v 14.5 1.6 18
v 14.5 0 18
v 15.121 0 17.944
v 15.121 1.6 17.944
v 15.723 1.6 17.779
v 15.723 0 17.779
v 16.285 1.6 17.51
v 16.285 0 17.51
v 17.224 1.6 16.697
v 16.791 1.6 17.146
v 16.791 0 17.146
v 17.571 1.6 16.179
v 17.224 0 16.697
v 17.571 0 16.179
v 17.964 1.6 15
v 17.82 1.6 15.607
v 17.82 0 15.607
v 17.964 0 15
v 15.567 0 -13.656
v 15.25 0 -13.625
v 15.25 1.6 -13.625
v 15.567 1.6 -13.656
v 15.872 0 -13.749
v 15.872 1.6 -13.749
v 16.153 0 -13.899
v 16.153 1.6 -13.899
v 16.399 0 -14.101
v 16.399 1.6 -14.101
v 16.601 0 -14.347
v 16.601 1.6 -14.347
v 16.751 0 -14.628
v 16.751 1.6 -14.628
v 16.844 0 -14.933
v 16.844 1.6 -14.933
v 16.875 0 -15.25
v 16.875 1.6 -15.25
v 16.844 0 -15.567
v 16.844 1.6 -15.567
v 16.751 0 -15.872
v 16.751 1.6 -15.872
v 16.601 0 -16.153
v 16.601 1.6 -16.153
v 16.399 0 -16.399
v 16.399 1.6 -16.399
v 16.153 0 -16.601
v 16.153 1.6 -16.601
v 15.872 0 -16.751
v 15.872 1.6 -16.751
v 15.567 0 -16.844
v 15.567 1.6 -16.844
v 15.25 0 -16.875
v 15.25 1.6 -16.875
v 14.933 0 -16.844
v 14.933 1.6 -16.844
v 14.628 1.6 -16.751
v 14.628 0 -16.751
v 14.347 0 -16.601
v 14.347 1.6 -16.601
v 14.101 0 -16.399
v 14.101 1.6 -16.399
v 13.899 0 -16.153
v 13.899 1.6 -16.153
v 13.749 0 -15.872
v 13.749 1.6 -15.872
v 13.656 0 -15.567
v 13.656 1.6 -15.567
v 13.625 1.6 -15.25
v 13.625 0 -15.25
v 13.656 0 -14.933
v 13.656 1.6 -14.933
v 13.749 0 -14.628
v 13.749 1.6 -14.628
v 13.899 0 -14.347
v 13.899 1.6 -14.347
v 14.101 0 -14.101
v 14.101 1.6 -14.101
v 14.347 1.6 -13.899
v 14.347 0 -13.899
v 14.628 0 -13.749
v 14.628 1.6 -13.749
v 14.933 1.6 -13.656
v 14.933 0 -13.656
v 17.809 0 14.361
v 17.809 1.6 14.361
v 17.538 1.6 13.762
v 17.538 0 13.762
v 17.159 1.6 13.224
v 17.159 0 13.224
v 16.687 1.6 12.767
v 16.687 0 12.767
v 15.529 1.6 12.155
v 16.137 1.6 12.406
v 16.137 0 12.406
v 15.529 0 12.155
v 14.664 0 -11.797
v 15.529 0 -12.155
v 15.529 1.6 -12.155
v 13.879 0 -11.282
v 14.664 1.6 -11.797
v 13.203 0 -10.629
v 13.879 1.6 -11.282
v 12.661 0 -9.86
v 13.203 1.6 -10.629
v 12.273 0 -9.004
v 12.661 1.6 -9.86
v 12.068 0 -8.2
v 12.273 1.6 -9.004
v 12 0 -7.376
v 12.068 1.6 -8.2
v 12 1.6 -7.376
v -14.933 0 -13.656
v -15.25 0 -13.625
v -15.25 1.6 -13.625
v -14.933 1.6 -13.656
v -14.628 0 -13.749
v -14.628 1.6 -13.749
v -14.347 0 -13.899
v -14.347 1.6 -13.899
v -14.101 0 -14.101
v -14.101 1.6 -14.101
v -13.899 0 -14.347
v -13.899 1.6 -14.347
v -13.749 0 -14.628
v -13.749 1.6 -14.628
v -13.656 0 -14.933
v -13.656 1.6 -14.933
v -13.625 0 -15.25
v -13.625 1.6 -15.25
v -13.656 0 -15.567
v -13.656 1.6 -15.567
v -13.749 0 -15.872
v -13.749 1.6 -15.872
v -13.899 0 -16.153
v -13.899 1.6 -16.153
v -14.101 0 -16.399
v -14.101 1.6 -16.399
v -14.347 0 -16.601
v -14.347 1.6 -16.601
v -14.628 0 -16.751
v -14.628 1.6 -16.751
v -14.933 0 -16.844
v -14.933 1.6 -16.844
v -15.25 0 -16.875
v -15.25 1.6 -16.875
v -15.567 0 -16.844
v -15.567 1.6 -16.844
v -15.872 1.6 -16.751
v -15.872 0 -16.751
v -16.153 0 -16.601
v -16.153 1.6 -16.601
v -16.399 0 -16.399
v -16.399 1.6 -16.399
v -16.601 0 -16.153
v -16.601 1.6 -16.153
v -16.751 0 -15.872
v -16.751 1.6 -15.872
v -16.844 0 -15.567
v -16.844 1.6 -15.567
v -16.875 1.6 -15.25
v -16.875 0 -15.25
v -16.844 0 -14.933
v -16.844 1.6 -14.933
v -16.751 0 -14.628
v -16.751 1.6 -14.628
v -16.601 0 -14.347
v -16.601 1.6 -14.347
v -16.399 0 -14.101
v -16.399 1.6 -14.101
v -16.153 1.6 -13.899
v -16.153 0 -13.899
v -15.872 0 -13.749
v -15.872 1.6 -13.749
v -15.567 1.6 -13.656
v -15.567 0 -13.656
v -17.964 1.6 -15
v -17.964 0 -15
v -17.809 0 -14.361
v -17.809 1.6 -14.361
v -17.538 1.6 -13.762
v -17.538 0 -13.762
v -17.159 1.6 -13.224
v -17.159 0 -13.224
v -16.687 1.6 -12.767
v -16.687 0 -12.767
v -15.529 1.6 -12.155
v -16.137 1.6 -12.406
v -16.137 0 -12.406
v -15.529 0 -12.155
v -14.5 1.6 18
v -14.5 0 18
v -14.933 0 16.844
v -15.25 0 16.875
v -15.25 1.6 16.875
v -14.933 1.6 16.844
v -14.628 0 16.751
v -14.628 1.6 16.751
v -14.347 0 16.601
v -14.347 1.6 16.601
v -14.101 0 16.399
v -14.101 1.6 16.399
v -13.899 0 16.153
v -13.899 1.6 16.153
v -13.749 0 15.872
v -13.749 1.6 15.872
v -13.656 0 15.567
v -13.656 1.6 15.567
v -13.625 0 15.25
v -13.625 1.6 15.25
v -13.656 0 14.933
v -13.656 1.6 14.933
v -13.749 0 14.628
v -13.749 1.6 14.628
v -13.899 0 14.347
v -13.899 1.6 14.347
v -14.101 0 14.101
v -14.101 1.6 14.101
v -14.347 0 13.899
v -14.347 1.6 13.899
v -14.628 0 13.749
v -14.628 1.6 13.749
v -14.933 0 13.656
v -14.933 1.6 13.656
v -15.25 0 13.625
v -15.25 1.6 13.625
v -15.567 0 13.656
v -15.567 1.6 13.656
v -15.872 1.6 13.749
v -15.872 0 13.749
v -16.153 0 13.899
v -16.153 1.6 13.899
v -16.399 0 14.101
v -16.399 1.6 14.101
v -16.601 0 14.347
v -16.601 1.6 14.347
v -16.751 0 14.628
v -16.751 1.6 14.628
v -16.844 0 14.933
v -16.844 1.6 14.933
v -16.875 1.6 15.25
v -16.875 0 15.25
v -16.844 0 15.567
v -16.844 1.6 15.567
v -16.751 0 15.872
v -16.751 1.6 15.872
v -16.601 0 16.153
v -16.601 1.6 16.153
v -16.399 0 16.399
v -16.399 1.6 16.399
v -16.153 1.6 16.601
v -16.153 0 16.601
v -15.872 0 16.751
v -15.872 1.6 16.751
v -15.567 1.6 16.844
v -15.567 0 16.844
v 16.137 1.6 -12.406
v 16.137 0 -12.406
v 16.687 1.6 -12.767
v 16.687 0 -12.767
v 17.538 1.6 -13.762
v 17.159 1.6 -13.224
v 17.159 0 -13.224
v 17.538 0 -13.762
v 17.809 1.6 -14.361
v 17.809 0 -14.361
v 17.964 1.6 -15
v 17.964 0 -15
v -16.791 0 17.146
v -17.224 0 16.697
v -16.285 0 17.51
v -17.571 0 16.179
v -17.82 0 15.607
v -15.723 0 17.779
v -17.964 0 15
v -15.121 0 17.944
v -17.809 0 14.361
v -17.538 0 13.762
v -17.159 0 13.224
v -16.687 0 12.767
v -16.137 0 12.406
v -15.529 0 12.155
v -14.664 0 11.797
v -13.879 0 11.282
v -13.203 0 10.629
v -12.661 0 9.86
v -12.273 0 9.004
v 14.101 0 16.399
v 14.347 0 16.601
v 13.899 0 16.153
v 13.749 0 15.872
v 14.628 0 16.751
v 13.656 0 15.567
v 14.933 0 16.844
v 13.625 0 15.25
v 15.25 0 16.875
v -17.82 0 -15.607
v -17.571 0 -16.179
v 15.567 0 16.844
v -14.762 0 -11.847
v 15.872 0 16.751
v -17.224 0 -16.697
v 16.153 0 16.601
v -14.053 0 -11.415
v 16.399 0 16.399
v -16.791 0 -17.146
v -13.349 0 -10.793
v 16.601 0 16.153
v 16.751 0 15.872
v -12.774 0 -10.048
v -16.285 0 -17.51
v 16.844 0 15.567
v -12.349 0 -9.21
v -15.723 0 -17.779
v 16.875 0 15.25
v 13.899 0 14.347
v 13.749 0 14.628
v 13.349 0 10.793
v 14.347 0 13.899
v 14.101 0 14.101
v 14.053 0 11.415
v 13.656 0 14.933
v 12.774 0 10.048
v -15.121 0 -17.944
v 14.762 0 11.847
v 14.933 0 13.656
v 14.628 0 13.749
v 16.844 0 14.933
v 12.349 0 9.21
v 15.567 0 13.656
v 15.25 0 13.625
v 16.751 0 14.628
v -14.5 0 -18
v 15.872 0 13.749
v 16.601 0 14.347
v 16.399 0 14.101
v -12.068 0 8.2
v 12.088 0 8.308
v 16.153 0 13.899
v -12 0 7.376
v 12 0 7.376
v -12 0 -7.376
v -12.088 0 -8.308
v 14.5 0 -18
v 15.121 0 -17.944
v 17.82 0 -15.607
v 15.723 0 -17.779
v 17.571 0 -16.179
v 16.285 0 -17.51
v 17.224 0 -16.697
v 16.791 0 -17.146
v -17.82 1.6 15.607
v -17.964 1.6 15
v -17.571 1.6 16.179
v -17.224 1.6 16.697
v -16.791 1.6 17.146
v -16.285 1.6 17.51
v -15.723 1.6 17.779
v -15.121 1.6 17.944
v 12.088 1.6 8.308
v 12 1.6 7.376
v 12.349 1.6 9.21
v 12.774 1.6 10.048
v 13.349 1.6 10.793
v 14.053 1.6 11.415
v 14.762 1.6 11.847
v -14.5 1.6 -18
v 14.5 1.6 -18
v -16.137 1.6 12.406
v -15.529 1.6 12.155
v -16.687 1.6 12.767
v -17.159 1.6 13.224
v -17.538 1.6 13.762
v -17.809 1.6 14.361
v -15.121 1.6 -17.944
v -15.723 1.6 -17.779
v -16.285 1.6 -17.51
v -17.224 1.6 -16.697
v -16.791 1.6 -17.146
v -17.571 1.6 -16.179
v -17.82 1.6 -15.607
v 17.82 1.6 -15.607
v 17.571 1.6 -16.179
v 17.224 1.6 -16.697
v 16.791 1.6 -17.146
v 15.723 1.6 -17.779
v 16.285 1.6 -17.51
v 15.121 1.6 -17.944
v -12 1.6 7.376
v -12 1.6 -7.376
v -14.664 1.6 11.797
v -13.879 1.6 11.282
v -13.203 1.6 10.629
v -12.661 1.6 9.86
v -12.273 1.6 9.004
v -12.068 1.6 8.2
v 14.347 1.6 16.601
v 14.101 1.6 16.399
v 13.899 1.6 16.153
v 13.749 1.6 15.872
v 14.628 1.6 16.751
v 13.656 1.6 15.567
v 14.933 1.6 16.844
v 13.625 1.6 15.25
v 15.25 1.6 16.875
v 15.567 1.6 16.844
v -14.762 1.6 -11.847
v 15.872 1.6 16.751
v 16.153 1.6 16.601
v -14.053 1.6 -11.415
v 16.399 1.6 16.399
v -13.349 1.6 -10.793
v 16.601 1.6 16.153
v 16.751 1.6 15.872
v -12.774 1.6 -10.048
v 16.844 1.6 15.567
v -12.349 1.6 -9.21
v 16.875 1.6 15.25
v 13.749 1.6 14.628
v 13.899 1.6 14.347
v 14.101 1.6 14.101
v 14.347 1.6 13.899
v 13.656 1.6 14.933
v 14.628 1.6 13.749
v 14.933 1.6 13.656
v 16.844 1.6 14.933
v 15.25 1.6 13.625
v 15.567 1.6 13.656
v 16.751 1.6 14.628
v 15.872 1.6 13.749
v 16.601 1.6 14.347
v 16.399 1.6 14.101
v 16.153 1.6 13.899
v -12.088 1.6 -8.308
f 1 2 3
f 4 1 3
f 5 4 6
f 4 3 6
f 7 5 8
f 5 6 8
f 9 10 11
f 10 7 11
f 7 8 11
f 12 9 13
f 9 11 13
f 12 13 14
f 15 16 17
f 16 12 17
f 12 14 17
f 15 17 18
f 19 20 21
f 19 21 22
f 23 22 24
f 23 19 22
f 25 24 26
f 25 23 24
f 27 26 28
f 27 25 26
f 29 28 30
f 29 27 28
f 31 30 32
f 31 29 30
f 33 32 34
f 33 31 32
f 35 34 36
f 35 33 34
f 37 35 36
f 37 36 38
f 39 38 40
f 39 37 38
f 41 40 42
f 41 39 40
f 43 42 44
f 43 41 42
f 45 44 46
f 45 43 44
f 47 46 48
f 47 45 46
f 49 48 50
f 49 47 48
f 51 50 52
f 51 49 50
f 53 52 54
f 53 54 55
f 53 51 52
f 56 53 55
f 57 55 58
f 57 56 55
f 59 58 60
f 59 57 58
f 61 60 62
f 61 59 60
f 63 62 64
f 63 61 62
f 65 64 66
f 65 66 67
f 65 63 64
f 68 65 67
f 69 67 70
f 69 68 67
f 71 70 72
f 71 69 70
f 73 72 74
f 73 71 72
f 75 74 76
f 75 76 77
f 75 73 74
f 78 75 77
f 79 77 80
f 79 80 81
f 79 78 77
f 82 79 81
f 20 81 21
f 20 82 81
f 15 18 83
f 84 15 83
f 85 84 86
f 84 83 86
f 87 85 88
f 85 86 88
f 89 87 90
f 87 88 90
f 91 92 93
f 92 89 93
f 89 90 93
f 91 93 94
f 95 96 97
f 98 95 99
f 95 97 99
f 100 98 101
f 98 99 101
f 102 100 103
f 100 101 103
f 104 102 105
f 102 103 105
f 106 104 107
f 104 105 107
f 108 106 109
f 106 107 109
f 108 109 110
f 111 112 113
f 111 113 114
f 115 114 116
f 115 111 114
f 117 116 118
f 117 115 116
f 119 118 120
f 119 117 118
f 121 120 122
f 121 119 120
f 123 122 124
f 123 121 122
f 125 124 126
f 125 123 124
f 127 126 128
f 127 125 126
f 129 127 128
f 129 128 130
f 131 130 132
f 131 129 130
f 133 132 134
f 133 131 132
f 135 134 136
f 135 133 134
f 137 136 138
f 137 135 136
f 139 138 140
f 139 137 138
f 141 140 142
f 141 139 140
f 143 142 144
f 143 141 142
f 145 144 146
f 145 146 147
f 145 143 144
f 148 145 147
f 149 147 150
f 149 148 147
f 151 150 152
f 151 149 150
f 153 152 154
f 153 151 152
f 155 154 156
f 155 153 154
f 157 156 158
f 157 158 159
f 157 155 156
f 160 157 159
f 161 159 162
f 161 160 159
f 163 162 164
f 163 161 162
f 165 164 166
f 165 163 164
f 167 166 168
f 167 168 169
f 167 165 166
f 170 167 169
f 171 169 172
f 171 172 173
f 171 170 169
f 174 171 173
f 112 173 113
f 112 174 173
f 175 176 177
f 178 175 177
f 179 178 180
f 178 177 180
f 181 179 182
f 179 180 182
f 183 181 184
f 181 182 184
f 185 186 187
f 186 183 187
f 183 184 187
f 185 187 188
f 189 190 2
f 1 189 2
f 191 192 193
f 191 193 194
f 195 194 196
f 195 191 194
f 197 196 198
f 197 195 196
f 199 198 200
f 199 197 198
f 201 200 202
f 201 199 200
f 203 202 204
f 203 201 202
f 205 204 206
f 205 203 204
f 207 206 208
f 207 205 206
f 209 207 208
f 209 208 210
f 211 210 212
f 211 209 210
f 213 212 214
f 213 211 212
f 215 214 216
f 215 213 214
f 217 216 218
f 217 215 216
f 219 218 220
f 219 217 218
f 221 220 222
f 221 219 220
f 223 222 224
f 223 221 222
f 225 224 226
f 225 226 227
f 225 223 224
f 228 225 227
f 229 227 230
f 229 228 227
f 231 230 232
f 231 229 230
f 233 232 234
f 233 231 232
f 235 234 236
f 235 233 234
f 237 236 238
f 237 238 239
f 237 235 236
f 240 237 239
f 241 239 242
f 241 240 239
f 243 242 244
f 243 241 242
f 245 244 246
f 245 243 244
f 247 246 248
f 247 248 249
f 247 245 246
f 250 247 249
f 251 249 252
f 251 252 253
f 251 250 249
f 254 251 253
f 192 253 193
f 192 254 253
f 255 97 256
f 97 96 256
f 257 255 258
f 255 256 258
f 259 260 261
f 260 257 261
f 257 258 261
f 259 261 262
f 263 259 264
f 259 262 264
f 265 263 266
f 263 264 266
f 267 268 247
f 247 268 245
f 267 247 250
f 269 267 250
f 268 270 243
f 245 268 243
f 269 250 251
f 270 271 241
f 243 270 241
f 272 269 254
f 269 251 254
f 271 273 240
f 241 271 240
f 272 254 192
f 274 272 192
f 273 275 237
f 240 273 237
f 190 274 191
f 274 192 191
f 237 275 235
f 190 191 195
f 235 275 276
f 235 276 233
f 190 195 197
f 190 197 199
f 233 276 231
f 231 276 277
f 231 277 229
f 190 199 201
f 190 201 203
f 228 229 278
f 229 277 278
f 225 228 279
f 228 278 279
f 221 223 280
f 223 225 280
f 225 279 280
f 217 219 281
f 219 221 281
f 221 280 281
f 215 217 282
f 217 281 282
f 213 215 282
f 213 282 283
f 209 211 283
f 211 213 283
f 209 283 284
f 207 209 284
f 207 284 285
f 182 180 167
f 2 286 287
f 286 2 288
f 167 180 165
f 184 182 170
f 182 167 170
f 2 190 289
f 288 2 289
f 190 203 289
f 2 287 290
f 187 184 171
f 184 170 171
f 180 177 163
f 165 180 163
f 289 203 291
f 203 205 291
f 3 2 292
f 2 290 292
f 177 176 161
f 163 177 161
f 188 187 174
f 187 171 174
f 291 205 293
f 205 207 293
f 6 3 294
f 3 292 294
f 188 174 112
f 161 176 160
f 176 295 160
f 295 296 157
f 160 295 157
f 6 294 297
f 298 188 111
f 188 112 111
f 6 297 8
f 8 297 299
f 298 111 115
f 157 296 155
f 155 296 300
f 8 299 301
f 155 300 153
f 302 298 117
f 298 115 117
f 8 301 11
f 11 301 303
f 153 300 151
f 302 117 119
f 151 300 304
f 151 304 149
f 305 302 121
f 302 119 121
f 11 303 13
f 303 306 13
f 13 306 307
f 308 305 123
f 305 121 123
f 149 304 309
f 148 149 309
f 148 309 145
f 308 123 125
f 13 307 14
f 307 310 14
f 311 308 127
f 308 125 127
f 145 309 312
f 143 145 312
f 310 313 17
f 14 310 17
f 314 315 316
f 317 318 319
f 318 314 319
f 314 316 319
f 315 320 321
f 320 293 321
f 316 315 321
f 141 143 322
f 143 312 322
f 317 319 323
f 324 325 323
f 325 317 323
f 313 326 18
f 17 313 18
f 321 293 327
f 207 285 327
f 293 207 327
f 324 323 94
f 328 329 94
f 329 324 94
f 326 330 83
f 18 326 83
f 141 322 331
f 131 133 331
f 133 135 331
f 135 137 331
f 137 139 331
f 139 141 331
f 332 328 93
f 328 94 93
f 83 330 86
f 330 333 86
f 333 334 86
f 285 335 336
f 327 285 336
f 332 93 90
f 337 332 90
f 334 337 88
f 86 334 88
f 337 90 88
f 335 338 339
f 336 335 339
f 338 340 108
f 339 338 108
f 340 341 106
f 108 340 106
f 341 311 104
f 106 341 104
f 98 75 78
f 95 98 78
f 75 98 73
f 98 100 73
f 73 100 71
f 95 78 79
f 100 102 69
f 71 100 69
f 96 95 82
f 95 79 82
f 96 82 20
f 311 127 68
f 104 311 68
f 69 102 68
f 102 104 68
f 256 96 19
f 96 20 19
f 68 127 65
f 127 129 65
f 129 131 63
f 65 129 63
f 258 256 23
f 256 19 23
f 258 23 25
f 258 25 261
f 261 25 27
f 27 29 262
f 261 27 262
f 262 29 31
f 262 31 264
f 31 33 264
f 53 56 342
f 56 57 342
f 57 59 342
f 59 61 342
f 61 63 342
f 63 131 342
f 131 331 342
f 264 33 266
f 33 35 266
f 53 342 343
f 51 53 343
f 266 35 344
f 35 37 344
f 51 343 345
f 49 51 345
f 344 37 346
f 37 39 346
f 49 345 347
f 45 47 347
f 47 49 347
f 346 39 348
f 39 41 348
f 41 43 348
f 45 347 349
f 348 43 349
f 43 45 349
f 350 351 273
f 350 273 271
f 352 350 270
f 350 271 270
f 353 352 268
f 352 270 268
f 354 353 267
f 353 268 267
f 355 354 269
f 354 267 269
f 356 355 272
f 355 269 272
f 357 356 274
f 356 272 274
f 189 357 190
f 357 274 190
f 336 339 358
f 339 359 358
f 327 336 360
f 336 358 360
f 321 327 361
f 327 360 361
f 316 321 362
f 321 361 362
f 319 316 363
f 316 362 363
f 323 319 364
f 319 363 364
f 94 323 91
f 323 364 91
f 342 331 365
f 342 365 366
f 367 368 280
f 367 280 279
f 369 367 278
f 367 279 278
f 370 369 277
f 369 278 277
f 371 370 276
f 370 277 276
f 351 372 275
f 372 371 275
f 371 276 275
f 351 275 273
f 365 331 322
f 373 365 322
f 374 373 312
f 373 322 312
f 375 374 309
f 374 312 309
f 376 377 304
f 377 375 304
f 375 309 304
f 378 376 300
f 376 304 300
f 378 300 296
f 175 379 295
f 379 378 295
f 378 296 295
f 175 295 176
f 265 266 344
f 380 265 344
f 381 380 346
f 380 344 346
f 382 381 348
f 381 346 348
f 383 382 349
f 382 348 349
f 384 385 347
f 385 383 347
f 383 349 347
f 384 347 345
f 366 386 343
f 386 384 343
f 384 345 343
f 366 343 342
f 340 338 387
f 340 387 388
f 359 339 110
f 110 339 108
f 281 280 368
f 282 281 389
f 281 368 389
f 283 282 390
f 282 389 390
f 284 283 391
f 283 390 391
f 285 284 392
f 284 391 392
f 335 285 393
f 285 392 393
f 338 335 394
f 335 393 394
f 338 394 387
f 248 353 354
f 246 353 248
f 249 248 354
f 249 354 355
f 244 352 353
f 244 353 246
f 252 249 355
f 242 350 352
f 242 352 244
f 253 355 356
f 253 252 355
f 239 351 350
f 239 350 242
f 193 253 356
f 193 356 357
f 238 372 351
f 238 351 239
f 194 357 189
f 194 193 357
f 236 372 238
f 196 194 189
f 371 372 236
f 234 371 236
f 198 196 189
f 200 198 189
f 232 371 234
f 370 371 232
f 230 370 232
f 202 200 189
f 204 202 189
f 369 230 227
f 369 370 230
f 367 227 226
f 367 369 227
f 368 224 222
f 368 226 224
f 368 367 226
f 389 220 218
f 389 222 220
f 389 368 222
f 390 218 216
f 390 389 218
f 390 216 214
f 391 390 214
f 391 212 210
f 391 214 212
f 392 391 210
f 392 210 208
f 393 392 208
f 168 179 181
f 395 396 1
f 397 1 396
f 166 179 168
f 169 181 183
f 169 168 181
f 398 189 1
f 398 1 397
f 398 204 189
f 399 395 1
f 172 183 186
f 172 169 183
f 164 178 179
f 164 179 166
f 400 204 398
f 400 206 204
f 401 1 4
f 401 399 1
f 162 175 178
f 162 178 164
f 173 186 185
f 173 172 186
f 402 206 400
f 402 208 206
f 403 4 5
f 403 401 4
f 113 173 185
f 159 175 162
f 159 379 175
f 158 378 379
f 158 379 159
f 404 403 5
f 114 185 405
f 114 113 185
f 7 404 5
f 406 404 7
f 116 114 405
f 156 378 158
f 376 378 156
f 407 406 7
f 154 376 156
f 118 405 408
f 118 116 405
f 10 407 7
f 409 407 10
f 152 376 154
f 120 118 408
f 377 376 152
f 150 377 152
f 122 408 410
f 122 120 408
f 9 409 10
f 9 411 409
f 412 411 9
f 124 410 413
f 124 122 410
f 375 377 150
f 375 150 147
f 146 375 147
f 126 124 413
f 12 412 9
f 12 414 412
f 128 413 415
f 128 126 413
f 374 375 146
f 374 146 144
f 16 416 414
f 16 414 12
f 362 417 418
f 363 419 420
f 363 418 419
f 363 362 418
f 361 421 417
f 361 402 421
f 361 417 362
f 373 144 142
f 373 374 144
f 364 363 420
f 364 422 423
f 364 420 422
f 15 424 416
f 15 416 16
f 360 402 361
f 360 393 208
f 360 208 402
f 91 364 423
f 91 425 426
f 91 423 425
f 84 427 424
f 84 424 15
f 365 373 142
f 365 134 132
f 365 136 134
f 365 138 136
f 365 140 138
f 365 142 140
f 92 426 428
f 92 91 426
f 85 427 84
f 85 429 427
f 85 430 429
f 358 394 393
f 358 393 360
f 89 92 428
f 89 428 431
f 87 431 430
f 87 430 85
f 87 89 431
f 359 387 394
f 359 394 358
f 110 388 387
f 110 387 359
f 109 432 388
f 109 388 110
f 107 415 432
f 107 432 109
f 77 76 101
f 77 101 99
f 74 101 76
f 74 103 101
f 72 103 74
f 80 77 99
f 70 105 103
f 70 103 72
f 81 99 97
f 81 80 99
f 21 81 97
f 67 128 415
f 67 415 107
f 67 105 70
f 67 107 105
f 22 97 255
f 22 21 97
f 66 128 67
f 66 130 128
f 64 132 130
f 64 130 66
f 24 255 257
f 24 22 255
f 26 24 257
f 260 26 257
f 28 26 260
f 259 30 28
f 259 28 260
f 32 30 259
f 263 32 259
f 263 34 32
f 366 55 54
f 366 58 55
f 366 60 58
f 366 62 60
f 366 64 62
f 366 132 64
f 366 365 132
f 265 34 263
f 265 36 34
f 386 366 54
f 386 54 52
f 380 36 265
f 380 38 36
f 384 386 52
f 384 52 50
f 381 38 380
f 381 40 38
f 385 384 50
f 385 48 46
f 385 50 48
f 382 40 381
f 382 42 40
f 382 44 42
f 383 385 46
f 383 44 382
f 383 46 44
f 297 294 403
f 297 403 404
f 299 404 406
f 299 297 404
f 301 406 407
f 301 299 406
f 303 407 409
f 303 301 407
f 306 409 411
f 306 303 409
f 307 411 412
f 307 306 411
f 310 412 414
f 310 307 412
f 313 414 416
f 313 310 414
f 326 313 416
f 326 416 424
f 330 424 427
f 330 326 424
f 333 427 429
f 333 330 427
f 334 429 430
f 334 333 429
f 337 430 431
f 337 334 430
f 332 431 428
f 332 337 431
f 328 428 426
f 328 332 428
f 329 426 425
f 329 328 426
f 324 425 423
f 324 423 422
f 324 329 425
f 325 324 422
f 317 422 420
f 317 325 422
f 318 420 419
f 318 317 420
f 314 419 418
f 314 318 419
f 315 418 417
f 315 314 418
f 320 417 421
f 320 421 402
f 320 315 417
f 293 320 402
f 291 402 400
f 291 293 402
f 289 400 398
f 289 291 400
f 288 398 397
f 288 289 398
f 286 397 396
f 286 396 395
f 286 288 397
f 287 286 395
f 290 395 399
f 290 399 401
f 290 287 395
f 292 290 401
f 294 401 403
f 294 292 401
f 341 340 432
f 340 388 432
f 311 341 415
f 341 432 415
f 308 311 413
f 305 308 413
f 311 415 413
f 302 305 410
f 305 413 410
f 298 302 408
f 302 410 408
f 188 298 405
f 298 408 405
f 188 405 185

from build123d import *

# Parameters (mm, degrees)
SKETCH1_W           = 24
SKETCH1_H           = 6
SKETCH1_H_2         = 24
SKETCH1_W_2         = 6
SKETCH1_R           = 1.625
BOSS_EXTRUDE1_DEPTH = 1.6
FILLET1_R           = 3.5
FILLET2_R           = 5


with BuildPart() as part:
    # Sketch1 → Boss-Extrude1 (new body)
    # profile 1 of 7: a face of its own
    with BuildSketch(Plane(origin=(0, 0, 0), x_dir=(1, 0, 0), z_dir=(0, 1, 0))):
        with Locations((0, 15)):
            Rectangle(SKETCH1_W, SKETCH1_H)
    # profile 2 of 7: a face of its own
    with BuildSketch(Plane(origin=(0, 0, 0), x_dir=(1, 0, 0), z_dir=(0, 1, 0))):
        Rectangle(SKETCH1_W, SKETCH1_H_2)
    # profile 3 of 7: a face of its own
    with BuildSketch(Plane(origin=(0, 0, 0), x_dir=(1, 0, 0), z_dir=(0, 1, 0))):
        with Locations((15, -15)):
            Rectangle(SKETCH1_W_2, SKETCH1_H)
        with Locations(Location((15.25, -15.25, 0), (0, 0, 270))):
            Circle(SKETCH1_R, mode=Mode.SUBTRACT)
    # profile 4 of 7: a face of its own
    with BuildSketch(Plane(origin=(0, 0, 0), x_dir=(1, 0, 0), z_dir=(0, 1, 0))):
        with Locations((0, -15)):
            Rectangle(SKETCH1_W, SKETCH1_H)
    # profile 5 of 7: a face of its own
    with BuildSketch(Plane(origin=(0, 0, 0), x_dir=(1, 0, 0), z_dir=(0, 1, 0))):
        with Locations((-15, -15)):
            Rectangle(SKETCH1_W_2, SKETCH1_H)
        with Locations(Location((-15.25, -15.25, 0), (0, 0, 270))):
            Circle(SKETCH1_R, mode=Mode.SUBTRACT)
    # profile 6 of 7: a face of its own
    with BuildSketch(Plane(origin=(0, 0, 0), x_dir=(1, 0, 0), z_dir=(0, 1, 0))):
        with Locations((15, 15)):
            Rectangle(SKETCH1_W_2, SKETCH1_H)
        with Locations(Location((15.25, 15.25, 0), (0, 0, 270))):
            Circle(SKETCH1_R, mode=Mode.SUBTRACT)
    # profile 7 of 7: a face of its own
    with BuildSketch(Plane(origin=(0, 0, 0), x_dir=(1, 0, 0), z_dir=(0, 1, 0))):
        with Locations((-15, 15)):
            Rectangle(SKETCH1_W_2, SKETCH1_H)
        with Locations(Location((-15.25, 15.25, 0), (0, 0, 270))):
            Circle(SKETCH1_R, mode=Mode.SUBTRACT)
    extrude(amount=BOSS_EXTRUDE1_DEPTH)

    # Fillet1
    # the kernel refuses this fillet: 3.5 mm, written as the material it takes off along each edge
    with BuildSketch(Plane(origin=(-18, -8.75, 12), x_dir=(1, 0, 0), z_dir=(0, 1, 0)), Plane(origin=(-18, -8.75, -12), x_dir=(0, 0, -1), z_dir=(0, 1, 0)), Plane(origin=(18, -8.75, -12), x_dir=(-1, 0, 0), z_dir=(0, 1, 0)), Plane(origin=(18, -8.75, 12), x_dir=(0, 0, 1), z_dir=(0, 1, 0)), Plane(origin=(18, -8.75, 18), x_dir=(-1, 0, 0), z_dir=(0, 1, 0)), Plane(origin=(-18, -8.75, 18), x_dir=(0, 0, -1), z_dir=(0, 1, 0)), Plane(origin=(-18, -8.75, -18), x_dir=(1, 0, 0), z_dir=(0, 1, 0))) as fillet1_piece_1:
        with BuildLine():
            CenterArc((FILLET1_R, -FILLET1_R), FILLET1_R, 90, 90)
            Line((0, -FILLET1_R), (0, 0))
            Line((0, 0), (FILLET1_R, 0))
        make_face()
    extrude(amount=19.1, mode=Mode.SUBTRACT)
    with BuildSketch(Plane(origin=(18, -8.75, -18), x_dir=(-1, 0, 0), z_dir=(0, 1, 0))) as fillet1_piece_2:
        with BuildLine():
            CenterArc((FILLET1_R, FILLET1_R), FILLET1_R, 180, 90)
            Line((0, FILLET1_R), (0, 0))
            Line((0, 0), (FILLET1_R, 0))
        make_face()
    extrude(amount=19.1, mode=Mode.SUBTRACT)

    # Fillet2
    fillet2_edges = [part.edges().sort_by_distance(p)[0] for p in [
        (12, 0.8, -12),
        (12, 0.8, 12),
        (-12, 0.8, 12),
        (-12, 0.8, -12),
    ]]
    fillet(fillet2_edges, radius=FILLET2_R)


solid = part.part
